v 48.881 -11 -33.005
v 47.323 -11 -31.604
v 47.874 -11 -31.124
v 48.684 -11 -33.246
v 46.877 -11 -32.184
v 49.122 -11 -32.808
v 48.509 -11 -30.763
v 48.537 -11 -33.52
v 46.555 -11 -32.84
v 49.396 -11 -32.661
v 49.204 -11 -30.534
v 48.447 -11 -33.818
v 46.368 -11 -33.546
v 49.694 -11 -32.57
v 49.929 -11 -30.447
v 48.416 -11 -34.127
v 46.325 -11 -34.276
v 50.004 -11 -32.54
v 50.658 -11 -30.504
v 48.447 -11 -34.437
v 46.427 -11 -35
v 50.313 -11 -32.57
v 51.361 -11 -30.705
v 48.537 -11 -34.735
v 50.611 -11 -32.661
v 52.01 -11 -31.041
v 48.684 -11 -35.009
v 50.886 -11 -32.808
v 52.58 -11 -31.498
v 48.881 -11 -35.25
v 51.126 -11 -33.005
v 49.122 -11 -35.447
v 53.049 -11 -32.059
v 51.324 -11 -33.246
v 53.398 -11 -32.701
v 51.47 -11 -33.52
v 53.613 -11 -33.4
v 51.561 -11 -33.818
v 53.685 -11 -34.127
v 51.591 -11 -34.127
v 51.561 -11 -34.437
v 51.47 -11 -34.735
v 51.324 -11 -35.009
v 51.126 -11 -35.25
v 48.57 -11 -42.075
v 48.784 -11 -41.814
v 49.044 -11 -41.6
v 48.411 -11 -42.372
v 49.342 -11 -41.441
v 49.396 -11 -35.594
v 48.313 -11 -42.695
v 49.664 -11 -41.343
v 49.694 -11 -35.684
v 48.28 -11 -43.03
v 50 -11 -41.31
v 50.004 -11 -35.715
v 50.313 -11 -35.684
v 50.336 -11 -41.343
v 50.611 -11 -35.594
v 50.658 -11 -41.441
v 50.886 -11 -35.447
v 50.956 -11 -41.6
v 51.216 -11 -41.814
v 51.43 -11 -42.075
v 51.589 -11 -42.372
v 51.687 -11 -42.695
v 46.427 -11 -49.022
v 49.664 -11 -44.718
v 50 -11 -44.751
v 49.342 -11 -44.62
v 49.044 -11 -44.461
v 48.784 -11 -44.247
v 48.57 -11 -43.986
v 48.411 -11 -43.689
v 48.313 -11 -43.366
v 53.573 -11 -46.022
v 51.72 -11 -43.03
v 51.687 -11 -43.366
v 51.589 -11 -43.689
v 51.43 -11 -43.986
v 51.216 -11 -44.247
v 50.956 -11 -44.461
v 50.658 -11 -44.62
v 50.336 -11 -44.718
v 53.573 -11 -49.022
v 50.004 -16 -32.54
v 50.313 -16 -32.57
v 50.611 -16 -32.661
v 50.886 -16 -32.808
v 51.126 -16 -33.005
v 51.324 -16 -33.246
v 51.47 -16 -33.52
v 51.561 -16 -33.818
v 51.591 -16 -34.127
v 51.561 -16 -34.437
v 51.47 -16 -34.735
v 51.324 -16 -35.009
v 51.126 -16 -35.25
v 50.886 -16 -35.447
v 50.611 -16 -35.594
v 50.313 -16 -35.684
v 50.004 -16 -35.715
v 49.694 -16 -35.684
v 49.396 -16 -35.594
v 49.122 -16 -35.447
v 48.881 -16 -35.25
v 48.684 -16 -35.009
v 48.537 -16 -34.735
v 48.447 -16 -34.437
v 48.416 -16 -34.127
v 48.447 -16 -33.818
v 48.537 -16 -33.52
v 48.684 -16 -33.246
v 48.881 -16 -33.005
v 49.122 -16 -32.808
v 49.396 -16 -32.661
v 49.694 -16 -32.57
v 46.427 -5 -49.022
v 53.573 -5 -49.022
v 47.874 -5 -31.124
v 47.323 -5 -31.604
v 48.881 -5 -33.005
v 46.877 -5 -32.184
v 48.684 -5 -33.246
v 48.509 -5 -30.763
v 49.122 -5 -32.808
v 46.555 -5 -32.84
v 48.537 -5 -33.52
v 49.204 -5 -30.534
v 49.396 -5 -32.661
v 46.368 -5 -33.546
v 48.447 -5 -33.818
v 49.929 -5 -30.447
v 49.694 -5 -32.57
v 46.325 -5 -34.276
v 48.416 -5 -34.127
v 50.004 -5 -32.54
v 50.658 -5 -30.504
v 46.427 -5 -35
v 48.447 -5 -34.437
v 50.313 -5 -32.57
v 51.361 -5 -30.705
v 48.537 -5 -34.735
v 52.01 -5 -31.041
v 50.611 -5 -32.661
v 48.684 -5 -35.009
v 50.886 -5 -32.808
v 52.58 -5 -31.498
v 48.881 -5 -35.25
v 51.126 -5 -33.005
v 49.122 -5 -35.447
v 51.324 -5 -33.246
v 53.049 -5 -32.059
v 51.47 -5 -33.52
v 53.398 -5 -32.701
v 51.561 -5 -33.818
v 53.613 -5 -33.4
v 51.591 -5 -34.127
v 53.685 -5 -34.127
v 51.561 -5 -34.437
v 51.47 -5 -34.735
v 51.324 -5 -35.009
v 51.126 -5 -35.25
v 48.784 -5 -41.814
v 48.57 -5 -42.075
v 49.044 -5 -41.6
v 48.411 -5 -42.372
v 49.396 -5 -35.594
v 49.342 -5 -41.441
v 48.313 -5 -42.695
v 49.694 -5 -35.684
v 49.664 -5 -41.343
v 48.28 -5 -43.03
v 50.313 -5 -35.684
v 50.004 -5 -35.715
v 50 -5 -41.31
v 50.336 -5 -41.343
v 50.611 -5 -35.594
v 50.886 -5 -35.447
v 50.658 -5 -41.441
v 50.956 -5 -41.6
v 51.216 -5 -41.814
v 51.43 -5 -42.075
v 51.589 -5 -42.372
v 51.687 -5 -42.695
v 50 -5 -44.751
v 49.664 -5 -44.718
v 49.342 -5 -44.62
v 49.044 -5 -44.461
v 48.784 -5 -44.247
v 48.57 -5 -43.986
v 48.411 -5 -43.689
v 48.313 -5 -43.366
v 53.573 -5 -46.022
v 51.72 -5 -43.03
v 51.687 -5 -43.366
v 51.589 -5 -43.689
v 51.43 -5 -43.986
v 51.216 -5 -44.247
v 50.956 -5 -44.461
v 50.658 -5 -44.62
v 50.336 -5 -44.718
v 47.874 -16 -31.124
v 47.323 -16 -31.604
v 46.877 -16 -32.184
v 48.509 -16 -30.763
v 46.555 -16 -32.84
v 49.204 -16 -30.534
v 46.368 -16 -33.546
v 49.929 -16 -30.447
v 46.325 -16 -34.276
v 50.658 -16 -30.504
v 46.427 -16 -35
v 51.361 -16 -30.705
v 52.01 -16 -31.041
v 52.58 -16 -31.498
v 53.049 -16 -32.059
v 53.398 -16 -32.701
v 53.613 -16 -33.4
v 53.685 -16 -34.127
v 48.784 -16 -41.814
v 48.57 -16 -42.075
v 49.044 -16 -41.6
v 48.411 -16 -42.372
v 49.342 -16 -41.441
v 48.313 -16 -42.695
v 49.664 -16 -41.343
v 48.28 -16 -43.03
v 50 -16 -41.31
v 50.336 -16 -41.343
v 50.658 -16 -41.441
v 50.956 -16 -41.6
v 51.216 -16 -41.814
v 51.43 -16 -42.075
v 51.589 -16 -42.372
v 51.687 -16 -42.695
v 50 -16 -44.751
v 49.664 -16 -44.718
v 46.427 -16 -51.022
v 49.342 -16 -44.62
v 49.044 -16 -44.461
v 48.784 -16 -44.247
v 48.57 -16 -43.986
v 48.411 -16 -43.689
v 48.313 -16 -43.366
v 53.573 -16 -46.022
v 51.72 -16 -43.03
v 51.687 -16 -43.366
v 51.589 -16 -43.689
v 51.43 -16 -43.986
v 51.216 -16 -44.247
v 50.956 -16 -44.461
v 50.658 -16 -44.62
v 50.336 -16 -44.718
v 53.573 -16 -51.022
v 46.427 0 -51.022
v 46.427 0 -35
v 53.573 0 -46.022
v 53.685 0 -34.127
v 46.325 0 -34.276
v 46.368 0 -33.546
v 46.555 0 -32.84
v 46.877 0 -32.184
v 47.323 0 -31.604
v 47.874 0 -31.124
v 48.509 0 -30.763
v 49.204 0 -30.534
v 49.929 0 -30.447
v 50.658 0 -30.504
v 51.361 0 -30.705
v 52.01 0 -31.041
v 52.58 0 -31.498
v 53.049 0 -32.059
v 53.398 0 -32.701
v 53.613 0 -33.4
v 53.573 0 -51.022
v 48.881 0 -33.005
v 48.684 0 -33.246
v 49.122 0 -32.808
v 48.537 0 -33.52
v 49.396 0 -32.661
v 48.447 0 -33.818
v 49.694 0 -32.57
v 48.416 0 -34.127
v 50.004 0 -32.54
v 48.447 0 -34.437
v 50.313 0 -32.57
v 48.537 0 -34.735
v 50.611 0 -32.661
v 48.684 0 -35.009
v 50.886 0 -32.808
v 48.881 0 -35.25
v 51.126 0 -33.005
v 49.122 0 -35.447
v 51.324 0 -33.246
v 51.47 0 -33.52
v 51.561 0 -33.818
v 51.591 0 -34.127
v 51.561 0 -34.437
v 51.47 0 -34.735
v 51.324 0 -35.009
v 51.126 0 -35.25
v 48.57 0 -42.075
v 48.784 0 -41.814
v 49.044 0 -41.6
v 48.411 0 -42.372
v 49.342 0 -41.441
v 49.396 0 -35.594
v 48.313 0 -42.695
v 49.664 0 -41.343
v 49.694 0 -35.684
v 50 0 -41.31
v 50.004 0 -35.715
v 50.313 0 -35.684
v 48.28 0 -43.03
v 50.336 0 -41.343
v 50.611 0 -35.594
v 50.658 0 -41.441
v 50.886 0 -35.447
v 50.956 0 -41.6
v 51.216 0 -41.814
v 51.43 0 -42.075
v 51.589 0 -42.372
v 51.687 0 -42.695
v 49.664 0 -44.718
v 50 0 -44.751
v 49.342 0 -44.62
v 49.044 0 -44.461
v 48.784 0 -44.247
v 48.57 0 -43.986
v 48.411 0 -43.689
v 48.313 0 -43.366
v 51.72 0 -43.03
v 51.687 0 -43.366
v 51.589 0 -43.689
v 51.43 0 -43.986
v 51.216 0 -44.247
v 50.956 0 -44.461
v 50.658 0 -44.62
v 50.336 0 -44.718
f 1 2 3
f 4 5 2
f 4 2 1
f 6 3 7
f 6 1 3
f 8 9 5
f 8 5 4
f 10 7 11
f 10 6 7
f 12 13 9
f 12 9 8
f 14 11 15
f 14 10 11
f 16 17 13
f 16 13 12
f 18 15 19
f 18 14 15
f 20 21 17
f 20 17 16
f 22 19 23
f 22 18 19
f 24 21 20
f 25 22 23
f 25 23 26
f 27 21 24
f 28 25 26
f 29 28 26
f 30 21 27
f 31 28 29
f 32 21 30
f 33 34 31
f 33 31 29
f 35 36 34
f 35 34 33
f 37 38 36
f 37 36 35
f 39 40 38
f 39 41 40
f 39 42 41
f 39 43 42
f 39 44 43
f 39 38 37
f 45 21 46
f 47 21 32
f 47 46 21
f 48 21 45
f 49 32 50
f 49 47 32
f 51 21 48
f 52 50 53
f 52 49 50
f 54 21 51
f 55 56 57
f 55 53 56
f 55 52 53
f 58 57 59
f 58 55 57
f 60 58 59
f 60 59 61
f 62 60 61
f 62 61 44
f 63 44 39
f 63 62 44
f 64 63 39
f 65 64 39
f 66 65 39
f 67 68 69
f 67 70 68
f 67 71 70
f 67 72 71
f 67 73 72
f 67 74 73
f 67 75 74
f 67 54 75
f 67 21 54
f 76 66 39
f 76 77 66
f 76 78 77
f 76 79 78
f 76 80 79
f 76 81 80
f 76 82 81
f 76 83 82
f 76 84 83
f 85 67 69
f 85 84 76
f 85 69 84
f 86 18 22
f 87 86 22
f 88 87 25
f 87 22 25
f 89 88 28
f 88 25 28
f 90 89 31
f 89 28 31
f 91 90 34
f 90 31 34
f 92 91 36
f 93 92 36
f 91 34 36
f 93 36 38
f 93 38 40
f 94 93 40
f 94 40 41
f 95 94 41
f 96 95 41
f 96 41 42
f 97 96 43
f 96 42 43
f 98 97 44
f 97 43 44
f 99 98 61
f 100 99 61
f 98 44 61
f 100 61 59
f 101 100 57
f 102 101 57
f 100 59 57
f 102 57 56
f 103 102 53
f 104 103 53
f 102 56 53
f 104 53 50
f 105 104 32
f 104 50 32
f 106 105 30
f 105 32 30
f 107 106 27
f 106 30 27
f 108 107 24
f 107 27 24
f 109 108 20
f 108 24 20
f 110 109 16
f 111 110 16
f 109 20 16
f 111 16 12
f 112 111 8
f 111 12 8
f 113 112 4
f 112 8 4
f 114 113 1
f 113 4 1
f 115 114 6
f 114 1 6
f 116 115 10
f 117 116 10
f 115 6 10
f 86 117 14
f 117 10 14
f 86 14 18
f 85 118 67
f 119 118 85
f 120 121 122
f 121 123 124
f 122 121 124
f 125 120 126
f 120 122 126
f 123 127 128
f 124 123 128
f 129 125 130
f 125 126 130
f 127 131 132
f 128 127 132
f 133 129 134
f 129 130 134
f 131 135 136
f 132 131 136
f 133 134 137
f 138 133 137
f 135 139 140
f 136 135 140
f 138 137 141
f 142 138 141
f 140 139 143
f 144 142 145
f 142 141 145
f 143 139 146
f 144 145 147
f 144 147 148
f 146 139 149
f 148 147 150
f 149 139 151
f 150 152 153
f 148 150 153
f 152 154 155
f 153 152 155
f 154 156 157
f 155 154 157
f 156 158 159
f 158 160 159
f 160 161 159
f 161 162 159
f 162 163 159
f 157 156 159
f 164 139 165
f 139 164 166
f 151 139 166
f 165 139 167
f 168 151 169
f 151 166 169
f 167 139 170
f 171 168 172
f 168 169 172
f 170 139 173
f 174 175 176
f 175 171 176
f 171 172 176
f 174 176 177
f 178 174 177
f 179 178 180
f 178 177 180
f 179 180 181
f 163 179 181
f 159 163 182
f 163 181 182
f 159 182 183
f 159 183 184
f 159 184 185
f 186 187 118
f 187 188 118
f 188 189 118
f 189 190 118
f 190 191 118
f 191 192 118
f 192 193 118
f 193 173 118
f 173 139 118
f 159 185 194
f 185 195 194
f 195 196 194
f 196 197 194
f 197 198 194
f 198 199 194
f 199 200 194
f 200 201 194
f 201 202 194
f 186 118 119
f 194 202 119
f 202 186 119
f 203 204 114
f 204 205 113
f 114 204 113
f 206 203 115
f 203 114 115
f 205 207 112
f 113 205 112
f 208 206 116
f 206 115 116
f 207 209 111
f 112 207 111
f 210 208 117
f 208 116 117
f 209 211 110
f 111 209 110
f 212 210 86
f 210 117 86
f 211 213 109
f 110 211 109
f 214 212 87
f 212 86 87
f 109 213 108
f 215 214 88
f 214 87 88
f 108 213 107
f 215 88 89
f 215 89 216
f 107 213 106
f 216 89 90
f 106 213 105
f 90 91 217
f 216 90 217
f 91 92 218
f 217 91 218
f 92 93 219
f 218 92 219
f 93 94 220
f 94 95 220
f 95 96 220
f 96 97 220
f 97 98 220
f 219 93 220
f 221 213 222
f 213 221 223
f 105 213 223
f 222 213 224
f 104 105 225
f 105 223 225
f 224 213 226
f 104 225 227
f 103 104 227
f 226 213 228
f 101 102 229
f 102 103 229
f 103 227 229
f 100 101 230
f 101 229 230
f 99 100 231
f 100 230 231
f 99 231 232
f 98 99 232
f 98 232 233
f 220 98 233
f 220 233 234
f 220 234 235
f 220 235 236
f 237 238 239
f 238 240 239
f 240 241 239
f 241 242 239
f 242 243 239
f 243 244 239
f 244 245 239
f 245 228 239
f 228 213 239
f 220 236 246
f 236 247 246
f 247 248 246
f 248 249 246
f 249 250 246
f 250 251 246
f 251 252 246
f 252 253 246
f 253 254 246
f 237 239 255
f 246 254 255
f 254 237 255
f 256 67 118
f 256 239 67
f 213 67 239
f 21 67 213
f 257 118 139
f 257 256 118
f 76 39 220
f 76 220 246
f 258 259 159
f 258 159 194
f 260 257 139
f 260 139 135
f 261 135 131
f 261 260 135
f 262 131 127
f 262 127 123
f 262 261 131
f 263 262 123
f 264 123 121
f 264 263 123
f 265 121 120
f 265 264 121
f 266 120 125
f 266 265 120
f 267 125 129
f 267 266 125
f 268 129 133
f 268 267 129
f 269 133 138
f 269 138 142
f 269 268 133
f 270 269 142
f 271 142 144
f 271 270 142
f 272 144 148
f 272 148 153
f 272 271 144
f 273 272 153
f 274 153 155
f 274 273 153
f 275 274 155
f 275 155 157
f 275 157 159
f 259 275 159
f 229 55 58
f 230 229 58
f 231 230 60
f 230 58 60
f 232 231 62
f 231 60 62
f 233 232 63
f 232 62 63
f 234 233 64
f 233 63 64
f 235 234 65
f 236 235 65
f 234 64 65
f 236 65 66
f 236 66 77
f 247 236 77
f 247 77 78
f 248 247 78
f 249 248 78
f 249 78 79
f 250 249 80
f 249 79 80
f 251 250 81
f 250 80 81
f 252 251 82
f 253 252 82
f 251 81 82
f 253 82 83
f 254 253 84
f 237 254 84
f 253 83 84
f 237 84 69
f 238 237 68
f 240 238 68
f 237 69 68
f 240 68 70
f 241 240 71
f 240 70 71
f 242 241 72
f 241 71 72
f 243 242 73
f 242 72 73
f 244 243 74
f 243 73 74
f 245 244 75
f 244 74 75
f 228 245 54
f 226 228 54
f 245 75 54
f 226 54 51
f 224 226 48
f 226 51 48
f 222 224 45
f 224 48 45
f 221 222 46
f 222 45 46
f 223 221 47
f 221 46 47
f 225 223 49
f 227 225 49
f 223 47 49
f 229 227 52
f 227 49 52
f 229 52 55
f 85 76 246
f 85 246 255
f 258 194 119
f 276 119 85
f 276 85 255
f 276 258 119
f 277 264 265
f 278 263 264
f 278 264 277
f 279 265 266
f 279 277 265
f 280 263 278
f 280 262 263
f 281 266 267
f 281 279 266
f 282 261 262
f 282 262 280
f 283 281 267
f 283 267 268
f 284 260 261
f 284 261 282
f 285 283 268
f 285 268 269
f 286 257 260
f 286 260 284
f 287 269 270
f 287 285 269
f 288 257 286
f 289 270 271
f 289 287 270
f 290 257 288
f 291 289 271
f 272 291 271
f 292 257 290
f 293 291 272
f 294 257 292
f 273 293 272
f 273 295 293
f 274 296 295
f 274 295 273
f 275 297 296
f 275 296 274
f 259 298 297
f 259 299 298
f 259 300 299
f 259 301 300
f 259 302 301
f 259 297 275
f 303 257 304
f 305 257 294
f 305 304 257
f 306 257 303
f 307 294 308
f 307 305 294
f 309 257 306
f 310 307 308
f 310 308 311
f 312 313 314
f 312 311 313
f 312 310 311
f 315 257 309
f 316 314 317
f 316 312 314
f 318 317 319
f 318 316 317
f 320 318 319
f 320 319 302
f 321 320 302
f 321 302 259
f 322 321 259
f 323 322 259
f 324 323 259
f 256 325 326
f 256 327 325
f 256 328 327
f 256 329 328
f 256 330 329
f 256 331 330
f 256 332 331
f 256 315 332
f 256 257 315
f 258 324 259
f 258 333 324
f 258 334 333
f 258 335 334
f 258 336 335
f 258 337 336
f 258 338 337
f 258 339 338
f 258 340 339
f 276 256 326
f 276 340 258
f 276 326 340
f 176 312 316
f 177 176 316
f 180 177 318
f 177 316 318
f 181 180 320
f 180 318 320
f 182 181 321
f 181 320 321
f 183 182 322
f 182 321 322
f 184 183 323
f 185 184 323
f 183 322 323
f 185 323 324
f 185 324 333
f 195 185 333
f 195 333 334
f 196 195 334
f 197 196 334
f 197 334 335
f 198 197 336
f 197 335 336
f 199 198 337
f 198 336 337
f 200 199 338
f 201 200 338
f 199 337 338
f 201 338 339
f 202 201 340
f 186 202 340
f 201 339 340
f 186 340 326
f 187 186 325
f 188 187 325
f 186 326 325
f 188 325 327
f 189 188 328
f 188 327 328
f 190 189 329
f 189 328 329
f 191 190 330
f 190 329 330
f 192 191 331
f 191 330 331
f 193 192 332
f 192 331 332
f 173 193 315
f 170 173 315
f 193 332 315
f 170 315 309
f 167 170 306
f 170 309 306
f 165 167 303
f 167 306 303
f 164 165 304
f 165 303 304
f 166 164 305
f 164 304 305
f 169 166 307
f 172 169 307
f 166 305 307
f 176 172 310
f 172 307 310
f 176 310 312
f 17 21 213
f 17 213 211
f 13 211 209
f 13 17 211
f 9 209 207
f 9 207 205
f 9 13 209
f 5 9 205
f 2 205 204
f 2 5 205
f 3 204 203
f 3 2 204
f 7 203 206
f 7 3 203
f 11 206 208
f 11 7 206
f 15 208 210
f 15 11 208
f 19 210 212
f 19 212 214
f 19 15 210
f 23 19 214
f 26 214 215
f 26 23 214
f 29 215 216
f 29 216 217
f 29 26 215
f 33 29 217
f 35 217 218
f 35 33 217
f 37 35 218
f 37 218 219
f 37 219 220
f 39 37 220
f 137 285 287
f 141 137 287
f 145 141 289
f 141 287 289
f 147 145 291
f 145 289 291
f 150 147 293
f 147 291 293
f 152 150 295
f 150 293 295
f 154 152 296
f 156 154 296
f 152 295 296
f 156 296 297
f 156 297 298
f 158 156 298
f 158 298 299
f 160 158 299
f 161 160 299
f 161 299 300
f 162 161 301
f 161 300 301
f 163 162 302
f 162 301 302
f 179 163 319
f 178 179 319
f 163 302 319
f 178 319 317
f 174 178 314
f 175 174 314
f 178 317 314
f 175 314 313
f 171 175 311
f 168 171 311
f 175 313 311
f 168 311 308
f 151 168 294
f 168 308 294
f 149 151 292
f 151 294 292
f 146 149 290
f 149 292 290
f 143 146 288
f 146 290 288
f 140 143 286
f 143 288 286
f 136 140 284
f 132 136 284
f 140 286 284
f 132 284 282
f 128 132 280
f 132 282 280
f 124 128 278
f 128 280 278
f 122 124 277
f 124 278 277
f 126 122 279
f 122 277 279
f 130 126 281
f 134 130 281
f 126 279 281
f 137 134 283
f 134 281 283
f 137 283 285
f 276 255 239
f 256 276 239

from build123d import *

# Parameters (mm, degrees)
CROQUIS2_R              = 1.720307827
CROQUIS2_R_2            = 1.5875
SALIENTE_EXTRUIR1_DEPTH = 5
CROQUIS2_4_W            = 7.146105916
CROQUIS2_4_H            = 2
SALIENTE_EXTRUIR2_DEPTH = 11
SALIENTE_EXTRUIR3_START = -11
CROQUIS2_5_R            = 1.720307827
CROQUIS2_5_R_2          = 1.5875
SALIENTE_EXTRUIR3_DEPTH = 5


with BuildPart() as part:
    # Croquis2 → Saliente-Extruir1 (new body)
    with BuildSketch(Plane(origin=(0, 0, 0), x_dir=(1, 0, 0), z_dir=(0, 1, 0))):
        with BuildLine():
            ThreePointArc((46.426947042, 35), (49.564233927, 30.472202028), (53.685223181, 34.127468235))
            Line((53.685223181, 34.127468235), (53.573052958, 46.021630377))
            Line((53.573052958, 46.021630377), (53.573052958, 49.021630377))
            Line((53.573052958, 49.021630377), (46.426947042, 49.021630377))
            Line((46.426947042, 49.021630377), (46.426947042, 35))
        make_face()
        with Locations((50, 43.030352088)):
            Circle(CROQUIS2_R, mode=Mode.SUBTRACT)
        with Locations((50.003640725, 34.127468235)):
            Circle(CROQUIS2_R_2, mode=Mode.SUBTRACT)
    extrude(amount=-SALIENTE_EXTRUIR1_DEPTH)

    # Croquis2<4> → Saliente-Extruir2 (add)
    with BuildSketch(Plane(origin=(0, 0, 0), x_dir=(1, 0, 0), z_dir=(0, 1, 0))):
        with Locations((50, 50.021630377)):
            Rectangle(CROQUIS2_4_W, CROQUIS2_4_H)
    extrude(amount=-SALIENTE_EXTRUIR2_DEPTH)

    # Croquis2<5> → Saliente-Extruir3 (add)
    with BuildSketch(Plane(origin=(0, 0, 0), x_dir=(1, 0, 0), z_dir=(0, 1, 0)).offset(SALIENTE_EXTRUIR3_START)):
        with BuildLine():
            ThreePointArc((46.426947042, 35), (49.564233927, 30.472202028), (53.685223181, 34.127468235))
            Line((53.685223181, 34.127468235), (53.573052958, 46.021630377))
            Line((53.573052958, 46.021630377), (53.573052958, 51.021630377))
            Line((53.573052958, 51.021630377), (46.426947042, 51.021630377))
            Line((46.426947042, 51.021630377), (46.426947042, 35))
        make_face()
        with Locations((50, 43.030352088)):
            Circle(CROQUIS2_5_R, mode=Mode.SUBTRACT)
        with Locations((50.003640725, 34.127468235)):
            Circle(CROQUIS2_5_R_2, mode=Mode.SUBTRACT)
    extrude(amount=-SALIENTE_EXTRUIR3_DEPTH)


solid = part.part
